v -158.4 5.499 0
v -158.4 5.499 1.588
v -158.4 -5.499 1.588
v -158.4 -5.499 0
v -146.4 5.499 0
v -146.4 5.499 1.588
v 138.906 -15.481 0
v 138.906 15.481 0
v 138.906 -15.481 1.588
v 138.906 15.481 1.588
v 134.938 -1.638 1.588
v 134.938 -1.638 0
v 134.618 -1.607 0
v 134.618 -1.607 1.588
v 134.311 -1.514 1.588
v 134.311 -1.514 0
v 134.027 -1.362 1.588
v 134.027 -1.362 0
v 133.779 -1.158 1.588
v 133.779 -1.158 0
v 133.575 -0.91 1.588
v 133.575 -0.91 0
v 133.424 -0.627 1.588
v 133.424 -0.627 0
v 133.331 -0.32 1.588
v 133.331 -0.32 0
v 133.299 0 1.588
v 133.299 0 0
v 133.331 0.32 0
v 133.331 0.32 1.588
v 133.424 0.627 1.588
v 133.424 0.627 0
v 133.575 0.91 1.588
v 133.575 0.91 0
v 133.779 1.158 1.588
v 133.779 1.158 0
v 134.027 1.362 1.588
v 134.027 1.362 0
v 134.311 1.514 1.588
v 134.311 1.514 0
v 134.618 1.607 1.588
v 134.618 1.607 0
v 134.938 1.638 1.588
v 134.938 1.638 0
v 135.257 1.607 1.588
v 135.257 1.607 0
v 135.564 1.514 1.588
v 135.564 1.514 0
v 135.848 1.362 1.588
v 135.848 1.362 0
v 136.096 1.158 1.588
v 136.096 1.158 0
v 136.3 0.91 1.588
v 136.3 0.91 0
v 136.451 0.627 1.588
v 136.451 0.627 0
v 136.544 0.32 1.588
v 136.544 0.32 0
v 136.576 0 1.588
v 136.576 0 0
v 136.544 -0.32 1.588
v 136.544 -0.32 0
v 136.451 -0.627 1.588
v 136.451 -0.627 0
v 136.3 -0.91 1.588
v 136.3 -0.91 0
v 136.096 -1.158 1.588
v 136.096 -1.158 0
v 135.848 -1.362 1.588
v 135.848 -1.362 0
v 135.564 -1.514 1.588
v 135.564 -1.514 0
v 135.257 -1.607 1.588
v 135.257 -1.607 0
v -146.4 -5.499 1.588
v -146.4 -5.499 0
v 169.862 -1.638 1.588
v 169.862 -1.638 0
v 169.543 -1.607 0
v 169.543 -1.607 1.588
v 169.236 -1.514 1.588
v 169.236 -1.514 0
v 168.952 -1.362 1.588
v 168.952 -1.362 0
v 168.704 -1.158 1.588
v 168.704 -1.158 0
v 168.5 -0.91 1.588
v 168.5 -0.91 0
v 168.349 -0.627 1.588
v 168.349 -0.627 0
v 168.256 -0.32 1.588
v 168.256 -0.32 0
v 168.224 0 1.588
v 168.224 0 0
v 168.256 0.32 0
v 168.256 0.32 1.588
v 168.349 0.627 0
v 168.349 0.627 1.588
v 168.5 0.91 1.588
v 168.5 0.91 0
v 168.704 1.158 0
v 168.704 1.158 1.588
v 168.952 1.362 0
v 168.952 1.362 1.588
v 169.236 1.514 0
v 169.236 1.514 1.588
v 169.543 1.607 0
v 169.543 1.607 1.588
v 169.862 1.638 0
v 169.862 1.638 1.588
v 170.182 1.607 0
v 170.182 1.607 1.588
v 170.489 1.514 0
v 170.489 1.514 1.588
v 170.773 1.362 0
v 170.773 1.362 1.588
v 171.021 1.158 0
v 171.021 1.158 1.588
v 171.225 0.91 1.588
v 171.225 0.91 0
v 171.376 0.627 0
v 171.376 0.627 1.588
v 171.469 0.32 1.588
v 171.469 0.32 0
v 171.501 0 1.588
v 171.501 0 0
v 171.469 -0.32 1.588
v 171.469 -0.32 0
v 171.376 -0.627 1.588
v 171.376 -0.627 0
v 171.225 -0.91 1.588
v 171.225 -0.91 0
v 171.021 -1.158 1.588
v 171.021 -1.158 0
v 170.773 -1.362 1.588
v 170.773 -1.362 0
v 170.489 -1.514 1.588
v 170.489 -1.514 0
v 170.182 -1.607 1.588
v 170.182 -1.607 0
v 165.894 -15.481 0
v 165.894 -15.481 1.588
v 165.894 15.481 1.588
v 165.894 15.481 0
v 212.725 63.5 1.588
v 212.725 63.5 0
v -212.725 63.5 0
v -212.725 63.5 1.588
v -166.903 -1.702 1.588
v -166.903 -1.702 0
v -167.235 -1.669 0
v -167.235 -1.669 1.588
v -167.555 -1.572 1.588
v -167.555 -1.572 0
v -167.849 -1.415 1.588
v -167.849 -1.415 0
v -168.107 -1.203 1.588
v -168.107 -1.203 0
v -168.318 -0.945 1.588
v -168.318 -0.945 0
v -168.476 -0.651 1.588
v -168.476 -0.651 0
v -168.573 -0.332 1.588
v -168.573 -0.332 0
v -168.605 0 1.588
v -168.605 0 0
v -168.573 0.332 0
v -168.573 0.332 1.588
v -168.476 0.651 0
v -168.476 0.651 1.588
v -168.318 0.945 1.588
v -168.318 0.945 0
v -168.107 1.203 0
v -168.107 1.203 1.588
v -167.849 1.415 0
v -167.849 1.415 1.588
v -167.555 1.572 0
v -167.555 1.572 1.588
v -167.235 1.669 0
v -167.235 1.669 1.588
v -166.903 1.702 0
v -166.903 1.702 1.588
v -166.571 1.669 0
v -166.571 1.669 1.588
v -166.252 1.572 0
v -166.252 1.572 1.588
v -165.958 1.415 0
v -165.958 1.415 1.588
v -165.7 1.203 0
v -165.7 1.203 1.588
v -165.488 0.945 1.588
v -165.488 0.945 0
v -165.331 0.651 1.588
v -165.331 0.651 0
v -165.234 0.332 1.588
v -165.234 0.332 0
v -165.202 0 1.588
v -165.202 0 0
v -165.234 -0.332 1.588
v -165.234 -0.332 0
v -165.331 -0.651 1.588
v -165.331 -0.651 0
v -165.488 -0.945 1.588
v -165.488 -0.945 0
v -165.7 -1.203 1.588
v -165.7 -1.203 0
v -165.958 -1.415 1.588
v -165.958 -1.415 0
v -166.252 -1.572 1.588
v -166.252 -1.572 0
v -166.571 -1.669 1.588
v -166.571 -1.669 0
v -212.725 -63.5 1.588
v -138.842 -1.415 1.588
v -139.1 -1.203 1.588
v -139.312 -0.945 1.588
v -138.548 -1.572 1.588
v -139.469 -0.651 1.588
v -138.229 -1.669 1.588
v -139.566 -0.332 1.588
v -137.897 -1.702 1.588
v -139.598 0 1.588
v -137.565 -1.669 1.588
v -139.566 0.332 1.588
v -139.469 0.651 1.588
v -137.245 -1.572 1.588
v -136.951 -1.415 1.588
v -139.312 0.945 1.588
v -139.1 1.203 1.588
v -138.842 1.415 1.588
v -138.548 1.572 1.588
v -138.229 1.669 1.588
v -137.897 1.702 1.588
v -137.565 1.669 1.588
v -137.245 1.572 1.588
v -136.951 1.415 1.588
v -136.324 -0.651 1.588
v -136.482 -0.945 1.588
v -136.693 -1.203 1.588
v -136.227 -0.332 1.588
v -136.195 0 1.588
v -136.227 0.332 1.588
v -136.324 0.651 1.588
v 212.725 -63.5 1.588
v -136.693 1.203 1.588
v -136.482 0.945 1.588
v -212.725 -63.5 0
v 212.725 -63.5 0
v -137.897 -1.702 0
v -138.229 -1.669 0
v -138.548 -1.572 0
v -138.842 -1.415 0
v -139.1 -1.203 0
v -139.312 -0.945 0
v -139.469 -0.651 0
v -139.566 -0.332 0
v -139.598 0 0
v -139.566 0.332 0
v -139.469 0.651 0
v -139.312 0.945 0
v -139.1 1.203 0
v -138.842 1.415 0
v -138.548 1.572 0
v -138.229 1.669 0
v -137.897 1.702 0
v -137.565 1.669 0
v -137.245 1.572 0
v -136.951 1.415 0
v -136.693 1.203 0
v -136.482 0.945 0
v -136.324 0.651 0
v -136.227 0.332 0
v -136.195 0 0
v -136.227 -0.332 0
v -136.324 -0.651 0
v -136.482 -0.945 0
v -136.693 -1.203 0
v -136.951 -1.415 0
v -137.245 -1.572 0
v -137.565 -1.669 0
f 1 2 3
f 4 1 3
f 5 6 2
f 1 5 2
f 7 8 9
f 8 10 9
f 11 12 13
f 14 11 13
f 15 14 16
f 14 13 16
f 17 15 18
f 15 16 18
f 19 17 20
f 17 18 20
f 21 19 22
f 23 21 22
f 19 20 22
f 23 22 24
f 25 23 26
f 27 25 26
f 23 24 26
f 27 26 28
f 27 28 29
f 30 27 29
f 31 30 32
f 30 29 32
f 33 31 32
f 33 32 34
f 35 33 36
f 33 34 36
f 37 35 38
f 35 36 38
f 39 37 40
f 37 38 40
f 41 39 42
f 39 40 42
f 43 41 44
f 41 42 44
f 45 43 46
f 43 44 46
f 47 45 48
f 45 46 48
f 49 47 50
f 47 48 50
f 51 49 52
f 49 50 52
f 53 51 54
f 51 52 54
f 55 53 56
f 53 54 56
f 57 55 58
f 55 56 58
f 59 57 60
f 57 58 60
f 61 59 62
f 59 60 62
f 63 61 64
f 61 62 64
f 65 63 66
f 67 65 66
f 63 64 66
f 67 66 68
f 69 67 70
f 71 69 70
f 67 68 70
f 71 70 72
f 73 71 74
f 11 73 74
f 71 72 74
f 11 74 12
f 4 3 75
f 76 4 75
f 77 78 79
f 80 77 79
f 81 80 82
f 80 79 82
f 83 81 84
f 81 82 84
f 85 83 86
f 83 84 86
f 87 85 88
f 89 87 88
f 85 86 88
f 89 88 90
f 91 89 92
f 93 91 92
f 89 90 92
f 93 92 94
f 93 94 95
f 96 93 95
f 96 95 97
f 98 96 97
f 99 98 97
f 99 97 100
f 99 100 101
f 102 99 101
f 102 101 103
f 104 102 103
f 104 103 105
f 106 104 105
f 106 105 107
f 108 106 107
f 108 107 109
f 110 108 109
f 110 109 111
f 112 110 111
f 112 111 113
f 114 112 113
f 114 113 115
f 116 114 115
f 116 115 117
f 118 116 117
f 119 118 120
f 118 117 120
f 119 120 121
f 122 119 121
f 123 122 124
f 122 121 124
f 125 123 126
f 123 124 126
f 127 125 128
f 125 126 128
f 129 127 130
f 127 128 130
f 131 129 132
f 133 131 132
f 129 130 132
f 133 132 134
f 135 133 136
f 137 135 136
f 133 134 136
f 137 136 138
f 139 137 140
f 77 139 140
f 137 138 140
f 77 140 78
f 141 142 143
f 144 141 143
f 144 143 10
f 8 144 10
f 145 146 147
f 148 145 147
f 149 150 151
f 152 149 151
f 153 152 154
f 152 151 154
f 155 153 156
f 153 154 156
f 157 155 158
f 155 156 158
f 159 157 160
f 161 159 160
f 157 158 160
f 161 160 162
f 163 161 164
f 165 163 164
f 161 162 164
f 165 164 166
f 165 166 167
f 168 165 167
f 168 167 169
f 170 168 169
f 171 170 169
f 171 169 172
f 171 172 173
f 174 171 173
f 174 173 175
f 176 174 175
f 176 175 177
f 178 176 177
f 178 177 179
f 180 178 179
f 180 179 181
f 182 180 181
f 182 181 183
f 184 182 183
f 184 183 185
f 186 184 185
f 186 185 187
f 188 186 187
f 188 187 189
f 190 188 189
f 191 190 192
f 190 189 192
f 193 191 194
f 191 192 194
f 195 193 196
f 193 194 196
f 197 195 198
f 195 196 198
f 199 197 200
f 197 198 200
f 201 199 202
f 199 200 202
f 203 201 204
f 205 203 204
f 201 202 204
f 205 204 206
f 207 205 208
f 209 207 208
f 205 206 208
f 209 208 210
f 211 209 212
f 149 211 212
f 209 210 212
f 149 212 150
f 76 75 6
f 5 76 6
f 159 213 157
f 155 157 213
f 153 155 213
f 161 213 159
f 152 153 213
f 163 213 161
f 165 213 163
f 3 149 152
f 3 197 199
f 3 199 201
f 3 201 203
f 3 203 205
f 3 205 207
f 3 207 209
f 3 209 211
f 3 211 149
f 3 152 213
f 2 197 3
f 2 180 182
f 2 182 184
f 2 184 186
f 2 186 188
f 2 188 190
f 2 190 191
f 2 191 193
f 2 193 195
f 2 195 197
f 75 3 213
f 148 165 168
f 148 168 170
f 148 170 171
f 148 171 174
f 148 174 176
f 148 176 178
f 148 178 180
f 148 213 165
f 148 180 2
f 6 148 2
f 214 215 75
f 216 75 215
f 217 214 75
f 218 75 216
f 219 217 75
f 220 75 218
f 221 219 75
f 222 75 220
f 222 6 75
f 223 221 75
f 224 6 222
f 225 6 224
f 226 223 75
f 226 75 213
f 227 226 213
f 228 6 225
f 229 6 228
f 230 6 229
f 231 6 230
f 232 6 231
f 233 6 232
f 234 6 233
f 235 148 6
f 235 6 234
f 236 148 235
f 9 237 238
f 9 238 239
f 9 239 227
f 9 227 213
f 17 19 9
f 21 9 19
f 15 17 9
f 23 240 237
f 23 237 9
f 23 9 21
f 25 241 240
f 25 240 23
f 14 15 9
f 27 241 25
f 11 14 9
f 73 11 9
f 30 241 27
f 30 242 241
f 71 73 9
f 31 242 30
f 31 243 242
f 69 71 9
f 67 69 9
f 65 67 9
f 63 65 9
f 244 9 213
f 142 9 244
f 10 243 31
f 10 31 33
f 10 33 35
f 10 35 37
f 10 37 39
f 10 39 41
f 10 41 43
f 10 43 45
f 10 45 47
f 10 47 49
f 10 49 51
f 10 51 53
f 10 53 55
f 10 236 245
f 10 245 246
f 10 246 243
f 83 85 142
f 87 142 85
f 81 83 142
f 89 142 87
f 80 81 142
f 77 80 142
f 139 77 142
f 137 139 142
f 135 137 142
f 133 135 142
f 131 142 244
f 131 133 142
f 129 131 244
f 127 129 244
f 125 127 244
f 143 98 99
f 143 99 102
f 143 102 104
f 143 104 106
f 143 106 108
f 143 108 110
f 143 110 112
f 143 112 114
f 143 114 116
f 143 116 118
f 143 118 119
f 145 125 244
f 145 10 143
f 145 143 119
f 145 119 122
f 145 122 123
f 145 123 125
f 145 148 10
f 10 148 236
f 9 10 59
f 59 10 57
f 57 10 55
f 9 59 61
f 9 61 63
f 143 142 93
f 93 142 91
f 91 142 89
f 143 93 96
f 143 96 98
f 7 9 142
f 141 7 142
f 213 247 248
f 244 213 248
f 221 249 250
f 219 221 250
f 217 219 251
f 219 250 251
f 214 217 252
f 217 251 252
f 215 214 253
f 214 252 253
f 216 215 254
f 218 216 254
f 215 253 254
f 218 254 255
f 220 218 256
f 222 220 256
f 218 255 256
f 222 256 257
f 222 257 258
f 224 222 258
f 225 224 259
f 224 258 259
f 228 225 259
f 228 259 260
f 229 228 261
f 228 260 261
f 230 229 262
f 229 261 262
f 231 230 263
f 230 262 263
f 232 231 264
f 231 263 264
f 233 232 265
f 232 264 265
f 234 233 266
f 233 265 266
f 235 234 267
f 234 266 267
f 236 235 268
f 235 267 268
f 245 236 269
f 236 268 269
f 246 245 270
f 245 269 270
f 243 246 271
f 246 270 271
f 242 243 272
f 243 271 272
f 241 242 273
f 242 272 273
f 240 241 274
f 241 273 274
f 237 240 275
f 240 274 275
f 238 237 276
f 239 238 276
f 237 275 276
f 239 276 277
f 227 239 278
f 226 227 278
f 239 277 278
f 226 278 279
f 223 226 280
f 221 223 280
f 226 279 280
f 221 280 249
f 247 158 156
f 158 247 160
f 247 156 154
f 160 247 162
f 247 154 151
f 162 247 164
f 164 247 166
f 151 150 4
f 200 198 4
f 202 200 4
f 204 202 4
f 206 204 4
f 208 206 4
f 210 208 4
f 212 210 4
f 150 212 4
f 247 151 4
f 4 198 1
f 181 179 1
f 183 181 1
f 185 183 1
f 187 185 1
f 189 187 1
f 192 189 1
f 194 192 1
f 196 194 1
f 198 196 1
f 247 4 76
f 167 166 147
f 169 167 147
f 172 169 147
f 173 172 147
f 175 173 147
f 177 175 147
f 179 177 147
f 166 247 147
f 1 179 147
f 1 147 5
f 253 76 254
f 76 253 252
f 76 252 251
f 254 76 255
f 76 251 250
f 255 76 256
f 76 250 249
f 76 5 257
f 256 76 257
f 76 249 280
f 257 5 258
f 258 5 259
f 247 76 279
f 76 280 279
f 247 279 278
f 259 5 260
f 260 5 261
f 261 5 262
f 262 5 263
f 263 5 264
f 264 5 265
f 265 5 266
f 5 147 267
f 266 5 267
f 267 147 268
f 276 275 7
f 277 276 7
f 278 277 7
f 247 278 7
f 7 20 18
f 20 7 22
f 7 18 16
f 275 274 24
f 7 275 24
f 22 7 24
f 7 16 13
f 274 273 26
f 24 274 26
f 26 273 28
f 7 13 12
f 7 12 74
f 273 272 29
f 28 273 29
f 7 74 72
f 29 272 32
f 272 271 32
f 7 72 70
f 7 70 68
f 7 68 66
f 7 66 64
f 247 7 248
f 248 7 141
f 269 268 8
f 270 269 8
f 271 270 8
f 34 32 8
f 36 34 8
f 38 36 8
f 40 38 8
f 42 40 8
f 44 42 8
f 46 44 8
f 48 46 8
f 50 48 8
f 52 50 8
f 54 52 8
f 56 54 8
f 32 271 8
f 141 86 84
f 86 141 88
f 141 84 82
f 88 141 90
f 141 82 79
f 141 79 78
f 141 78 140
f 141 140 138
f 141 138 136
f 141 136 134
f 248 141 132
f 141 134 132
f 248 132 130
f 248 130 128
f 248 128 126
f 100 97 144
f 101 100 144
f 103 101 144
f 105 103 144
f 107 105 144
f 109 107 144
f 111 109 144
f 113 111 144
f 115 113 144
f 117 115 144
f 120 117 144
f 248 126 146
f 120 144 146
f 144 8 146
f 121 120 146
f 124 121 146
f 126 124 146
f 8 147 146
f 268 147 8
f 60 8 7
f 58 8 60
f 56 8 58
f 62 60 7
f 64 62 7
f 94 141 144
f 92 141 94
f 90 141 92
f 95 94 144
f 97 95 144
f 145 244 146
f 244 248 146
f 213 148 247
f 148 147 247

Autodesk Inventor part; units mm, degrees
ref_plane "YZ Plane" through (0, 0, 0) normal (1, 0, 0) x (0, 1, 0)
ref_plane "XZ Plane" through (0, 0, 0) normal (0, 1, 0) x (-1, 0, 0)
ref_plane "XY Plane" through (0, 0, 0) normal (0, 0, 1) x (1, 0, 0)
sketch "Sketch1" plane through (0, 0, 0) normal (0, 0, 1) x (1, 0, 0)
  line L0 (-212.725, -63.5) -> (212.725, -63.5)
  line L1 (212.725, -63.5) -> (212.725, 63.5)
  line L2 (212.725, 63.5) -> (-212.725, 63.5)
  line L3 (-212.725, 63.5) -> (-212.725, -63.5)
  line L4 (-212.725, -63.5) -> (212.725, 63.5) construction
  line L5 (212.725, -63.5) -> (-212.725, 63.5) construction
  point P0 (0, 0)
  dimension "d0" = 127
  dimension "d1" = 425.45
extrude "Extrusion1" add sketch "Sketch1" along normal blind 1.5875
sketch "Sketch2" plane through (0, 0, 1.5875) normal (0, 0, 1) x (1, 0, 0)
  line L0 (152.4, -16.2954) -> (-152.4, -16.2954)
  line L1 (-152.4, -16.2954) -> (-152.4, 16.2954)
  line L2 (-152.4, 16.2954) -> (152.4, 16.2954)
  line L3 (152.4, 16.2954) -> (152.4, -16.2954)
  line L4 (152.4, -16.2954) -> (-152.4, 16.2954) construction
  line L5 (-152.4, -16.2954) -> (152.4, 16.2954) construction
  line L6 (-158.4, -5.4991) -> (-146.4, -5.4991)
  line L7 (-146.4, -5.4991) -> (-146.4, 5.4991)
  line L8 (-146.4, 5.4991) -> (-158.4, 5.4991)
  line L9 (-158.4, 5.4991) -> (-158.4, -5.4991)
  line L10 (-158.4, -5.4991) -> (-146.4, 5.4991) construction
  line L11 (-146.4, -5.4991) -> (-158.4, 5.4991) construction
  line L12 (138.9062, -15.4813) -> (165.8937, -15.4813)
  line L13 (165.8937, -15.4813) -> (165.8937, 15.4813)
  line L14 (165.8937, 15.4813) -> (138.9062, 15.4813)
  line L15 (138.9062, 15.4813) -> (138.9062, -15.4813)
  line L16 (138.9062, -15.4813) -> (165.8937, 15.4813) construction
  line L17 (165.8937, -15.4813) -> (138.9062, 15.4813) construction
  point P0 (0, 0)
  point P1 (-137.8966, 0)
  point P2 (-166.9034, 0)
  dimension "d4" = 304.8
  dimension "d5" = 12
  dimension "d6" = 10.9982
  dimension "d9" = 26.9875
  dimension "d10" = 30.9626
extrude "Extrusion2" cut sketch "Sketch2" against normal up to next contours L12 L15 L14 L3 | L3 L14 L13 L12 | L6 L9 L8 L1 | L1 L8 L7 L6
sketch "Sketch3" plane through (0, 0, 1.5875) normal (0, 0, 1) x (1, 0, 0)
  point P0 (0, 0)
hole "Hole1" at (-166.9034, 0, 1.5875) at (-137.8966, 0, 1.5875) direction (0, 0, -1) diameter 3.4036 end through all clearance for "Flat Head Machine Screw" size "M3" standard "Ansi Metric M Profile"
sketch "Sketch4" plane through (0, 0, 1.5875) normal (0, 0, 1) x (1, 0, 0)
  point P0 (0, 0)
  point P1 (169.8625, 0)
  point P2 (134.9375, 0)
  point P3 (152.4, 0)
  dimension "d22" = 34.925
  dimension "d23" = 17.4625
  dimension "d24" = 152.4
hole "Hole2" at (134.9375, 0, 1.5875) at (169.8625, 0, 1.5875) direction (0, 0, -1) diameter 3.2766 end through all clearance for "Flat Head Machine Screw (82)" size "#4" standard "Ansi Unified Screw Threads"
properties part number "back"
